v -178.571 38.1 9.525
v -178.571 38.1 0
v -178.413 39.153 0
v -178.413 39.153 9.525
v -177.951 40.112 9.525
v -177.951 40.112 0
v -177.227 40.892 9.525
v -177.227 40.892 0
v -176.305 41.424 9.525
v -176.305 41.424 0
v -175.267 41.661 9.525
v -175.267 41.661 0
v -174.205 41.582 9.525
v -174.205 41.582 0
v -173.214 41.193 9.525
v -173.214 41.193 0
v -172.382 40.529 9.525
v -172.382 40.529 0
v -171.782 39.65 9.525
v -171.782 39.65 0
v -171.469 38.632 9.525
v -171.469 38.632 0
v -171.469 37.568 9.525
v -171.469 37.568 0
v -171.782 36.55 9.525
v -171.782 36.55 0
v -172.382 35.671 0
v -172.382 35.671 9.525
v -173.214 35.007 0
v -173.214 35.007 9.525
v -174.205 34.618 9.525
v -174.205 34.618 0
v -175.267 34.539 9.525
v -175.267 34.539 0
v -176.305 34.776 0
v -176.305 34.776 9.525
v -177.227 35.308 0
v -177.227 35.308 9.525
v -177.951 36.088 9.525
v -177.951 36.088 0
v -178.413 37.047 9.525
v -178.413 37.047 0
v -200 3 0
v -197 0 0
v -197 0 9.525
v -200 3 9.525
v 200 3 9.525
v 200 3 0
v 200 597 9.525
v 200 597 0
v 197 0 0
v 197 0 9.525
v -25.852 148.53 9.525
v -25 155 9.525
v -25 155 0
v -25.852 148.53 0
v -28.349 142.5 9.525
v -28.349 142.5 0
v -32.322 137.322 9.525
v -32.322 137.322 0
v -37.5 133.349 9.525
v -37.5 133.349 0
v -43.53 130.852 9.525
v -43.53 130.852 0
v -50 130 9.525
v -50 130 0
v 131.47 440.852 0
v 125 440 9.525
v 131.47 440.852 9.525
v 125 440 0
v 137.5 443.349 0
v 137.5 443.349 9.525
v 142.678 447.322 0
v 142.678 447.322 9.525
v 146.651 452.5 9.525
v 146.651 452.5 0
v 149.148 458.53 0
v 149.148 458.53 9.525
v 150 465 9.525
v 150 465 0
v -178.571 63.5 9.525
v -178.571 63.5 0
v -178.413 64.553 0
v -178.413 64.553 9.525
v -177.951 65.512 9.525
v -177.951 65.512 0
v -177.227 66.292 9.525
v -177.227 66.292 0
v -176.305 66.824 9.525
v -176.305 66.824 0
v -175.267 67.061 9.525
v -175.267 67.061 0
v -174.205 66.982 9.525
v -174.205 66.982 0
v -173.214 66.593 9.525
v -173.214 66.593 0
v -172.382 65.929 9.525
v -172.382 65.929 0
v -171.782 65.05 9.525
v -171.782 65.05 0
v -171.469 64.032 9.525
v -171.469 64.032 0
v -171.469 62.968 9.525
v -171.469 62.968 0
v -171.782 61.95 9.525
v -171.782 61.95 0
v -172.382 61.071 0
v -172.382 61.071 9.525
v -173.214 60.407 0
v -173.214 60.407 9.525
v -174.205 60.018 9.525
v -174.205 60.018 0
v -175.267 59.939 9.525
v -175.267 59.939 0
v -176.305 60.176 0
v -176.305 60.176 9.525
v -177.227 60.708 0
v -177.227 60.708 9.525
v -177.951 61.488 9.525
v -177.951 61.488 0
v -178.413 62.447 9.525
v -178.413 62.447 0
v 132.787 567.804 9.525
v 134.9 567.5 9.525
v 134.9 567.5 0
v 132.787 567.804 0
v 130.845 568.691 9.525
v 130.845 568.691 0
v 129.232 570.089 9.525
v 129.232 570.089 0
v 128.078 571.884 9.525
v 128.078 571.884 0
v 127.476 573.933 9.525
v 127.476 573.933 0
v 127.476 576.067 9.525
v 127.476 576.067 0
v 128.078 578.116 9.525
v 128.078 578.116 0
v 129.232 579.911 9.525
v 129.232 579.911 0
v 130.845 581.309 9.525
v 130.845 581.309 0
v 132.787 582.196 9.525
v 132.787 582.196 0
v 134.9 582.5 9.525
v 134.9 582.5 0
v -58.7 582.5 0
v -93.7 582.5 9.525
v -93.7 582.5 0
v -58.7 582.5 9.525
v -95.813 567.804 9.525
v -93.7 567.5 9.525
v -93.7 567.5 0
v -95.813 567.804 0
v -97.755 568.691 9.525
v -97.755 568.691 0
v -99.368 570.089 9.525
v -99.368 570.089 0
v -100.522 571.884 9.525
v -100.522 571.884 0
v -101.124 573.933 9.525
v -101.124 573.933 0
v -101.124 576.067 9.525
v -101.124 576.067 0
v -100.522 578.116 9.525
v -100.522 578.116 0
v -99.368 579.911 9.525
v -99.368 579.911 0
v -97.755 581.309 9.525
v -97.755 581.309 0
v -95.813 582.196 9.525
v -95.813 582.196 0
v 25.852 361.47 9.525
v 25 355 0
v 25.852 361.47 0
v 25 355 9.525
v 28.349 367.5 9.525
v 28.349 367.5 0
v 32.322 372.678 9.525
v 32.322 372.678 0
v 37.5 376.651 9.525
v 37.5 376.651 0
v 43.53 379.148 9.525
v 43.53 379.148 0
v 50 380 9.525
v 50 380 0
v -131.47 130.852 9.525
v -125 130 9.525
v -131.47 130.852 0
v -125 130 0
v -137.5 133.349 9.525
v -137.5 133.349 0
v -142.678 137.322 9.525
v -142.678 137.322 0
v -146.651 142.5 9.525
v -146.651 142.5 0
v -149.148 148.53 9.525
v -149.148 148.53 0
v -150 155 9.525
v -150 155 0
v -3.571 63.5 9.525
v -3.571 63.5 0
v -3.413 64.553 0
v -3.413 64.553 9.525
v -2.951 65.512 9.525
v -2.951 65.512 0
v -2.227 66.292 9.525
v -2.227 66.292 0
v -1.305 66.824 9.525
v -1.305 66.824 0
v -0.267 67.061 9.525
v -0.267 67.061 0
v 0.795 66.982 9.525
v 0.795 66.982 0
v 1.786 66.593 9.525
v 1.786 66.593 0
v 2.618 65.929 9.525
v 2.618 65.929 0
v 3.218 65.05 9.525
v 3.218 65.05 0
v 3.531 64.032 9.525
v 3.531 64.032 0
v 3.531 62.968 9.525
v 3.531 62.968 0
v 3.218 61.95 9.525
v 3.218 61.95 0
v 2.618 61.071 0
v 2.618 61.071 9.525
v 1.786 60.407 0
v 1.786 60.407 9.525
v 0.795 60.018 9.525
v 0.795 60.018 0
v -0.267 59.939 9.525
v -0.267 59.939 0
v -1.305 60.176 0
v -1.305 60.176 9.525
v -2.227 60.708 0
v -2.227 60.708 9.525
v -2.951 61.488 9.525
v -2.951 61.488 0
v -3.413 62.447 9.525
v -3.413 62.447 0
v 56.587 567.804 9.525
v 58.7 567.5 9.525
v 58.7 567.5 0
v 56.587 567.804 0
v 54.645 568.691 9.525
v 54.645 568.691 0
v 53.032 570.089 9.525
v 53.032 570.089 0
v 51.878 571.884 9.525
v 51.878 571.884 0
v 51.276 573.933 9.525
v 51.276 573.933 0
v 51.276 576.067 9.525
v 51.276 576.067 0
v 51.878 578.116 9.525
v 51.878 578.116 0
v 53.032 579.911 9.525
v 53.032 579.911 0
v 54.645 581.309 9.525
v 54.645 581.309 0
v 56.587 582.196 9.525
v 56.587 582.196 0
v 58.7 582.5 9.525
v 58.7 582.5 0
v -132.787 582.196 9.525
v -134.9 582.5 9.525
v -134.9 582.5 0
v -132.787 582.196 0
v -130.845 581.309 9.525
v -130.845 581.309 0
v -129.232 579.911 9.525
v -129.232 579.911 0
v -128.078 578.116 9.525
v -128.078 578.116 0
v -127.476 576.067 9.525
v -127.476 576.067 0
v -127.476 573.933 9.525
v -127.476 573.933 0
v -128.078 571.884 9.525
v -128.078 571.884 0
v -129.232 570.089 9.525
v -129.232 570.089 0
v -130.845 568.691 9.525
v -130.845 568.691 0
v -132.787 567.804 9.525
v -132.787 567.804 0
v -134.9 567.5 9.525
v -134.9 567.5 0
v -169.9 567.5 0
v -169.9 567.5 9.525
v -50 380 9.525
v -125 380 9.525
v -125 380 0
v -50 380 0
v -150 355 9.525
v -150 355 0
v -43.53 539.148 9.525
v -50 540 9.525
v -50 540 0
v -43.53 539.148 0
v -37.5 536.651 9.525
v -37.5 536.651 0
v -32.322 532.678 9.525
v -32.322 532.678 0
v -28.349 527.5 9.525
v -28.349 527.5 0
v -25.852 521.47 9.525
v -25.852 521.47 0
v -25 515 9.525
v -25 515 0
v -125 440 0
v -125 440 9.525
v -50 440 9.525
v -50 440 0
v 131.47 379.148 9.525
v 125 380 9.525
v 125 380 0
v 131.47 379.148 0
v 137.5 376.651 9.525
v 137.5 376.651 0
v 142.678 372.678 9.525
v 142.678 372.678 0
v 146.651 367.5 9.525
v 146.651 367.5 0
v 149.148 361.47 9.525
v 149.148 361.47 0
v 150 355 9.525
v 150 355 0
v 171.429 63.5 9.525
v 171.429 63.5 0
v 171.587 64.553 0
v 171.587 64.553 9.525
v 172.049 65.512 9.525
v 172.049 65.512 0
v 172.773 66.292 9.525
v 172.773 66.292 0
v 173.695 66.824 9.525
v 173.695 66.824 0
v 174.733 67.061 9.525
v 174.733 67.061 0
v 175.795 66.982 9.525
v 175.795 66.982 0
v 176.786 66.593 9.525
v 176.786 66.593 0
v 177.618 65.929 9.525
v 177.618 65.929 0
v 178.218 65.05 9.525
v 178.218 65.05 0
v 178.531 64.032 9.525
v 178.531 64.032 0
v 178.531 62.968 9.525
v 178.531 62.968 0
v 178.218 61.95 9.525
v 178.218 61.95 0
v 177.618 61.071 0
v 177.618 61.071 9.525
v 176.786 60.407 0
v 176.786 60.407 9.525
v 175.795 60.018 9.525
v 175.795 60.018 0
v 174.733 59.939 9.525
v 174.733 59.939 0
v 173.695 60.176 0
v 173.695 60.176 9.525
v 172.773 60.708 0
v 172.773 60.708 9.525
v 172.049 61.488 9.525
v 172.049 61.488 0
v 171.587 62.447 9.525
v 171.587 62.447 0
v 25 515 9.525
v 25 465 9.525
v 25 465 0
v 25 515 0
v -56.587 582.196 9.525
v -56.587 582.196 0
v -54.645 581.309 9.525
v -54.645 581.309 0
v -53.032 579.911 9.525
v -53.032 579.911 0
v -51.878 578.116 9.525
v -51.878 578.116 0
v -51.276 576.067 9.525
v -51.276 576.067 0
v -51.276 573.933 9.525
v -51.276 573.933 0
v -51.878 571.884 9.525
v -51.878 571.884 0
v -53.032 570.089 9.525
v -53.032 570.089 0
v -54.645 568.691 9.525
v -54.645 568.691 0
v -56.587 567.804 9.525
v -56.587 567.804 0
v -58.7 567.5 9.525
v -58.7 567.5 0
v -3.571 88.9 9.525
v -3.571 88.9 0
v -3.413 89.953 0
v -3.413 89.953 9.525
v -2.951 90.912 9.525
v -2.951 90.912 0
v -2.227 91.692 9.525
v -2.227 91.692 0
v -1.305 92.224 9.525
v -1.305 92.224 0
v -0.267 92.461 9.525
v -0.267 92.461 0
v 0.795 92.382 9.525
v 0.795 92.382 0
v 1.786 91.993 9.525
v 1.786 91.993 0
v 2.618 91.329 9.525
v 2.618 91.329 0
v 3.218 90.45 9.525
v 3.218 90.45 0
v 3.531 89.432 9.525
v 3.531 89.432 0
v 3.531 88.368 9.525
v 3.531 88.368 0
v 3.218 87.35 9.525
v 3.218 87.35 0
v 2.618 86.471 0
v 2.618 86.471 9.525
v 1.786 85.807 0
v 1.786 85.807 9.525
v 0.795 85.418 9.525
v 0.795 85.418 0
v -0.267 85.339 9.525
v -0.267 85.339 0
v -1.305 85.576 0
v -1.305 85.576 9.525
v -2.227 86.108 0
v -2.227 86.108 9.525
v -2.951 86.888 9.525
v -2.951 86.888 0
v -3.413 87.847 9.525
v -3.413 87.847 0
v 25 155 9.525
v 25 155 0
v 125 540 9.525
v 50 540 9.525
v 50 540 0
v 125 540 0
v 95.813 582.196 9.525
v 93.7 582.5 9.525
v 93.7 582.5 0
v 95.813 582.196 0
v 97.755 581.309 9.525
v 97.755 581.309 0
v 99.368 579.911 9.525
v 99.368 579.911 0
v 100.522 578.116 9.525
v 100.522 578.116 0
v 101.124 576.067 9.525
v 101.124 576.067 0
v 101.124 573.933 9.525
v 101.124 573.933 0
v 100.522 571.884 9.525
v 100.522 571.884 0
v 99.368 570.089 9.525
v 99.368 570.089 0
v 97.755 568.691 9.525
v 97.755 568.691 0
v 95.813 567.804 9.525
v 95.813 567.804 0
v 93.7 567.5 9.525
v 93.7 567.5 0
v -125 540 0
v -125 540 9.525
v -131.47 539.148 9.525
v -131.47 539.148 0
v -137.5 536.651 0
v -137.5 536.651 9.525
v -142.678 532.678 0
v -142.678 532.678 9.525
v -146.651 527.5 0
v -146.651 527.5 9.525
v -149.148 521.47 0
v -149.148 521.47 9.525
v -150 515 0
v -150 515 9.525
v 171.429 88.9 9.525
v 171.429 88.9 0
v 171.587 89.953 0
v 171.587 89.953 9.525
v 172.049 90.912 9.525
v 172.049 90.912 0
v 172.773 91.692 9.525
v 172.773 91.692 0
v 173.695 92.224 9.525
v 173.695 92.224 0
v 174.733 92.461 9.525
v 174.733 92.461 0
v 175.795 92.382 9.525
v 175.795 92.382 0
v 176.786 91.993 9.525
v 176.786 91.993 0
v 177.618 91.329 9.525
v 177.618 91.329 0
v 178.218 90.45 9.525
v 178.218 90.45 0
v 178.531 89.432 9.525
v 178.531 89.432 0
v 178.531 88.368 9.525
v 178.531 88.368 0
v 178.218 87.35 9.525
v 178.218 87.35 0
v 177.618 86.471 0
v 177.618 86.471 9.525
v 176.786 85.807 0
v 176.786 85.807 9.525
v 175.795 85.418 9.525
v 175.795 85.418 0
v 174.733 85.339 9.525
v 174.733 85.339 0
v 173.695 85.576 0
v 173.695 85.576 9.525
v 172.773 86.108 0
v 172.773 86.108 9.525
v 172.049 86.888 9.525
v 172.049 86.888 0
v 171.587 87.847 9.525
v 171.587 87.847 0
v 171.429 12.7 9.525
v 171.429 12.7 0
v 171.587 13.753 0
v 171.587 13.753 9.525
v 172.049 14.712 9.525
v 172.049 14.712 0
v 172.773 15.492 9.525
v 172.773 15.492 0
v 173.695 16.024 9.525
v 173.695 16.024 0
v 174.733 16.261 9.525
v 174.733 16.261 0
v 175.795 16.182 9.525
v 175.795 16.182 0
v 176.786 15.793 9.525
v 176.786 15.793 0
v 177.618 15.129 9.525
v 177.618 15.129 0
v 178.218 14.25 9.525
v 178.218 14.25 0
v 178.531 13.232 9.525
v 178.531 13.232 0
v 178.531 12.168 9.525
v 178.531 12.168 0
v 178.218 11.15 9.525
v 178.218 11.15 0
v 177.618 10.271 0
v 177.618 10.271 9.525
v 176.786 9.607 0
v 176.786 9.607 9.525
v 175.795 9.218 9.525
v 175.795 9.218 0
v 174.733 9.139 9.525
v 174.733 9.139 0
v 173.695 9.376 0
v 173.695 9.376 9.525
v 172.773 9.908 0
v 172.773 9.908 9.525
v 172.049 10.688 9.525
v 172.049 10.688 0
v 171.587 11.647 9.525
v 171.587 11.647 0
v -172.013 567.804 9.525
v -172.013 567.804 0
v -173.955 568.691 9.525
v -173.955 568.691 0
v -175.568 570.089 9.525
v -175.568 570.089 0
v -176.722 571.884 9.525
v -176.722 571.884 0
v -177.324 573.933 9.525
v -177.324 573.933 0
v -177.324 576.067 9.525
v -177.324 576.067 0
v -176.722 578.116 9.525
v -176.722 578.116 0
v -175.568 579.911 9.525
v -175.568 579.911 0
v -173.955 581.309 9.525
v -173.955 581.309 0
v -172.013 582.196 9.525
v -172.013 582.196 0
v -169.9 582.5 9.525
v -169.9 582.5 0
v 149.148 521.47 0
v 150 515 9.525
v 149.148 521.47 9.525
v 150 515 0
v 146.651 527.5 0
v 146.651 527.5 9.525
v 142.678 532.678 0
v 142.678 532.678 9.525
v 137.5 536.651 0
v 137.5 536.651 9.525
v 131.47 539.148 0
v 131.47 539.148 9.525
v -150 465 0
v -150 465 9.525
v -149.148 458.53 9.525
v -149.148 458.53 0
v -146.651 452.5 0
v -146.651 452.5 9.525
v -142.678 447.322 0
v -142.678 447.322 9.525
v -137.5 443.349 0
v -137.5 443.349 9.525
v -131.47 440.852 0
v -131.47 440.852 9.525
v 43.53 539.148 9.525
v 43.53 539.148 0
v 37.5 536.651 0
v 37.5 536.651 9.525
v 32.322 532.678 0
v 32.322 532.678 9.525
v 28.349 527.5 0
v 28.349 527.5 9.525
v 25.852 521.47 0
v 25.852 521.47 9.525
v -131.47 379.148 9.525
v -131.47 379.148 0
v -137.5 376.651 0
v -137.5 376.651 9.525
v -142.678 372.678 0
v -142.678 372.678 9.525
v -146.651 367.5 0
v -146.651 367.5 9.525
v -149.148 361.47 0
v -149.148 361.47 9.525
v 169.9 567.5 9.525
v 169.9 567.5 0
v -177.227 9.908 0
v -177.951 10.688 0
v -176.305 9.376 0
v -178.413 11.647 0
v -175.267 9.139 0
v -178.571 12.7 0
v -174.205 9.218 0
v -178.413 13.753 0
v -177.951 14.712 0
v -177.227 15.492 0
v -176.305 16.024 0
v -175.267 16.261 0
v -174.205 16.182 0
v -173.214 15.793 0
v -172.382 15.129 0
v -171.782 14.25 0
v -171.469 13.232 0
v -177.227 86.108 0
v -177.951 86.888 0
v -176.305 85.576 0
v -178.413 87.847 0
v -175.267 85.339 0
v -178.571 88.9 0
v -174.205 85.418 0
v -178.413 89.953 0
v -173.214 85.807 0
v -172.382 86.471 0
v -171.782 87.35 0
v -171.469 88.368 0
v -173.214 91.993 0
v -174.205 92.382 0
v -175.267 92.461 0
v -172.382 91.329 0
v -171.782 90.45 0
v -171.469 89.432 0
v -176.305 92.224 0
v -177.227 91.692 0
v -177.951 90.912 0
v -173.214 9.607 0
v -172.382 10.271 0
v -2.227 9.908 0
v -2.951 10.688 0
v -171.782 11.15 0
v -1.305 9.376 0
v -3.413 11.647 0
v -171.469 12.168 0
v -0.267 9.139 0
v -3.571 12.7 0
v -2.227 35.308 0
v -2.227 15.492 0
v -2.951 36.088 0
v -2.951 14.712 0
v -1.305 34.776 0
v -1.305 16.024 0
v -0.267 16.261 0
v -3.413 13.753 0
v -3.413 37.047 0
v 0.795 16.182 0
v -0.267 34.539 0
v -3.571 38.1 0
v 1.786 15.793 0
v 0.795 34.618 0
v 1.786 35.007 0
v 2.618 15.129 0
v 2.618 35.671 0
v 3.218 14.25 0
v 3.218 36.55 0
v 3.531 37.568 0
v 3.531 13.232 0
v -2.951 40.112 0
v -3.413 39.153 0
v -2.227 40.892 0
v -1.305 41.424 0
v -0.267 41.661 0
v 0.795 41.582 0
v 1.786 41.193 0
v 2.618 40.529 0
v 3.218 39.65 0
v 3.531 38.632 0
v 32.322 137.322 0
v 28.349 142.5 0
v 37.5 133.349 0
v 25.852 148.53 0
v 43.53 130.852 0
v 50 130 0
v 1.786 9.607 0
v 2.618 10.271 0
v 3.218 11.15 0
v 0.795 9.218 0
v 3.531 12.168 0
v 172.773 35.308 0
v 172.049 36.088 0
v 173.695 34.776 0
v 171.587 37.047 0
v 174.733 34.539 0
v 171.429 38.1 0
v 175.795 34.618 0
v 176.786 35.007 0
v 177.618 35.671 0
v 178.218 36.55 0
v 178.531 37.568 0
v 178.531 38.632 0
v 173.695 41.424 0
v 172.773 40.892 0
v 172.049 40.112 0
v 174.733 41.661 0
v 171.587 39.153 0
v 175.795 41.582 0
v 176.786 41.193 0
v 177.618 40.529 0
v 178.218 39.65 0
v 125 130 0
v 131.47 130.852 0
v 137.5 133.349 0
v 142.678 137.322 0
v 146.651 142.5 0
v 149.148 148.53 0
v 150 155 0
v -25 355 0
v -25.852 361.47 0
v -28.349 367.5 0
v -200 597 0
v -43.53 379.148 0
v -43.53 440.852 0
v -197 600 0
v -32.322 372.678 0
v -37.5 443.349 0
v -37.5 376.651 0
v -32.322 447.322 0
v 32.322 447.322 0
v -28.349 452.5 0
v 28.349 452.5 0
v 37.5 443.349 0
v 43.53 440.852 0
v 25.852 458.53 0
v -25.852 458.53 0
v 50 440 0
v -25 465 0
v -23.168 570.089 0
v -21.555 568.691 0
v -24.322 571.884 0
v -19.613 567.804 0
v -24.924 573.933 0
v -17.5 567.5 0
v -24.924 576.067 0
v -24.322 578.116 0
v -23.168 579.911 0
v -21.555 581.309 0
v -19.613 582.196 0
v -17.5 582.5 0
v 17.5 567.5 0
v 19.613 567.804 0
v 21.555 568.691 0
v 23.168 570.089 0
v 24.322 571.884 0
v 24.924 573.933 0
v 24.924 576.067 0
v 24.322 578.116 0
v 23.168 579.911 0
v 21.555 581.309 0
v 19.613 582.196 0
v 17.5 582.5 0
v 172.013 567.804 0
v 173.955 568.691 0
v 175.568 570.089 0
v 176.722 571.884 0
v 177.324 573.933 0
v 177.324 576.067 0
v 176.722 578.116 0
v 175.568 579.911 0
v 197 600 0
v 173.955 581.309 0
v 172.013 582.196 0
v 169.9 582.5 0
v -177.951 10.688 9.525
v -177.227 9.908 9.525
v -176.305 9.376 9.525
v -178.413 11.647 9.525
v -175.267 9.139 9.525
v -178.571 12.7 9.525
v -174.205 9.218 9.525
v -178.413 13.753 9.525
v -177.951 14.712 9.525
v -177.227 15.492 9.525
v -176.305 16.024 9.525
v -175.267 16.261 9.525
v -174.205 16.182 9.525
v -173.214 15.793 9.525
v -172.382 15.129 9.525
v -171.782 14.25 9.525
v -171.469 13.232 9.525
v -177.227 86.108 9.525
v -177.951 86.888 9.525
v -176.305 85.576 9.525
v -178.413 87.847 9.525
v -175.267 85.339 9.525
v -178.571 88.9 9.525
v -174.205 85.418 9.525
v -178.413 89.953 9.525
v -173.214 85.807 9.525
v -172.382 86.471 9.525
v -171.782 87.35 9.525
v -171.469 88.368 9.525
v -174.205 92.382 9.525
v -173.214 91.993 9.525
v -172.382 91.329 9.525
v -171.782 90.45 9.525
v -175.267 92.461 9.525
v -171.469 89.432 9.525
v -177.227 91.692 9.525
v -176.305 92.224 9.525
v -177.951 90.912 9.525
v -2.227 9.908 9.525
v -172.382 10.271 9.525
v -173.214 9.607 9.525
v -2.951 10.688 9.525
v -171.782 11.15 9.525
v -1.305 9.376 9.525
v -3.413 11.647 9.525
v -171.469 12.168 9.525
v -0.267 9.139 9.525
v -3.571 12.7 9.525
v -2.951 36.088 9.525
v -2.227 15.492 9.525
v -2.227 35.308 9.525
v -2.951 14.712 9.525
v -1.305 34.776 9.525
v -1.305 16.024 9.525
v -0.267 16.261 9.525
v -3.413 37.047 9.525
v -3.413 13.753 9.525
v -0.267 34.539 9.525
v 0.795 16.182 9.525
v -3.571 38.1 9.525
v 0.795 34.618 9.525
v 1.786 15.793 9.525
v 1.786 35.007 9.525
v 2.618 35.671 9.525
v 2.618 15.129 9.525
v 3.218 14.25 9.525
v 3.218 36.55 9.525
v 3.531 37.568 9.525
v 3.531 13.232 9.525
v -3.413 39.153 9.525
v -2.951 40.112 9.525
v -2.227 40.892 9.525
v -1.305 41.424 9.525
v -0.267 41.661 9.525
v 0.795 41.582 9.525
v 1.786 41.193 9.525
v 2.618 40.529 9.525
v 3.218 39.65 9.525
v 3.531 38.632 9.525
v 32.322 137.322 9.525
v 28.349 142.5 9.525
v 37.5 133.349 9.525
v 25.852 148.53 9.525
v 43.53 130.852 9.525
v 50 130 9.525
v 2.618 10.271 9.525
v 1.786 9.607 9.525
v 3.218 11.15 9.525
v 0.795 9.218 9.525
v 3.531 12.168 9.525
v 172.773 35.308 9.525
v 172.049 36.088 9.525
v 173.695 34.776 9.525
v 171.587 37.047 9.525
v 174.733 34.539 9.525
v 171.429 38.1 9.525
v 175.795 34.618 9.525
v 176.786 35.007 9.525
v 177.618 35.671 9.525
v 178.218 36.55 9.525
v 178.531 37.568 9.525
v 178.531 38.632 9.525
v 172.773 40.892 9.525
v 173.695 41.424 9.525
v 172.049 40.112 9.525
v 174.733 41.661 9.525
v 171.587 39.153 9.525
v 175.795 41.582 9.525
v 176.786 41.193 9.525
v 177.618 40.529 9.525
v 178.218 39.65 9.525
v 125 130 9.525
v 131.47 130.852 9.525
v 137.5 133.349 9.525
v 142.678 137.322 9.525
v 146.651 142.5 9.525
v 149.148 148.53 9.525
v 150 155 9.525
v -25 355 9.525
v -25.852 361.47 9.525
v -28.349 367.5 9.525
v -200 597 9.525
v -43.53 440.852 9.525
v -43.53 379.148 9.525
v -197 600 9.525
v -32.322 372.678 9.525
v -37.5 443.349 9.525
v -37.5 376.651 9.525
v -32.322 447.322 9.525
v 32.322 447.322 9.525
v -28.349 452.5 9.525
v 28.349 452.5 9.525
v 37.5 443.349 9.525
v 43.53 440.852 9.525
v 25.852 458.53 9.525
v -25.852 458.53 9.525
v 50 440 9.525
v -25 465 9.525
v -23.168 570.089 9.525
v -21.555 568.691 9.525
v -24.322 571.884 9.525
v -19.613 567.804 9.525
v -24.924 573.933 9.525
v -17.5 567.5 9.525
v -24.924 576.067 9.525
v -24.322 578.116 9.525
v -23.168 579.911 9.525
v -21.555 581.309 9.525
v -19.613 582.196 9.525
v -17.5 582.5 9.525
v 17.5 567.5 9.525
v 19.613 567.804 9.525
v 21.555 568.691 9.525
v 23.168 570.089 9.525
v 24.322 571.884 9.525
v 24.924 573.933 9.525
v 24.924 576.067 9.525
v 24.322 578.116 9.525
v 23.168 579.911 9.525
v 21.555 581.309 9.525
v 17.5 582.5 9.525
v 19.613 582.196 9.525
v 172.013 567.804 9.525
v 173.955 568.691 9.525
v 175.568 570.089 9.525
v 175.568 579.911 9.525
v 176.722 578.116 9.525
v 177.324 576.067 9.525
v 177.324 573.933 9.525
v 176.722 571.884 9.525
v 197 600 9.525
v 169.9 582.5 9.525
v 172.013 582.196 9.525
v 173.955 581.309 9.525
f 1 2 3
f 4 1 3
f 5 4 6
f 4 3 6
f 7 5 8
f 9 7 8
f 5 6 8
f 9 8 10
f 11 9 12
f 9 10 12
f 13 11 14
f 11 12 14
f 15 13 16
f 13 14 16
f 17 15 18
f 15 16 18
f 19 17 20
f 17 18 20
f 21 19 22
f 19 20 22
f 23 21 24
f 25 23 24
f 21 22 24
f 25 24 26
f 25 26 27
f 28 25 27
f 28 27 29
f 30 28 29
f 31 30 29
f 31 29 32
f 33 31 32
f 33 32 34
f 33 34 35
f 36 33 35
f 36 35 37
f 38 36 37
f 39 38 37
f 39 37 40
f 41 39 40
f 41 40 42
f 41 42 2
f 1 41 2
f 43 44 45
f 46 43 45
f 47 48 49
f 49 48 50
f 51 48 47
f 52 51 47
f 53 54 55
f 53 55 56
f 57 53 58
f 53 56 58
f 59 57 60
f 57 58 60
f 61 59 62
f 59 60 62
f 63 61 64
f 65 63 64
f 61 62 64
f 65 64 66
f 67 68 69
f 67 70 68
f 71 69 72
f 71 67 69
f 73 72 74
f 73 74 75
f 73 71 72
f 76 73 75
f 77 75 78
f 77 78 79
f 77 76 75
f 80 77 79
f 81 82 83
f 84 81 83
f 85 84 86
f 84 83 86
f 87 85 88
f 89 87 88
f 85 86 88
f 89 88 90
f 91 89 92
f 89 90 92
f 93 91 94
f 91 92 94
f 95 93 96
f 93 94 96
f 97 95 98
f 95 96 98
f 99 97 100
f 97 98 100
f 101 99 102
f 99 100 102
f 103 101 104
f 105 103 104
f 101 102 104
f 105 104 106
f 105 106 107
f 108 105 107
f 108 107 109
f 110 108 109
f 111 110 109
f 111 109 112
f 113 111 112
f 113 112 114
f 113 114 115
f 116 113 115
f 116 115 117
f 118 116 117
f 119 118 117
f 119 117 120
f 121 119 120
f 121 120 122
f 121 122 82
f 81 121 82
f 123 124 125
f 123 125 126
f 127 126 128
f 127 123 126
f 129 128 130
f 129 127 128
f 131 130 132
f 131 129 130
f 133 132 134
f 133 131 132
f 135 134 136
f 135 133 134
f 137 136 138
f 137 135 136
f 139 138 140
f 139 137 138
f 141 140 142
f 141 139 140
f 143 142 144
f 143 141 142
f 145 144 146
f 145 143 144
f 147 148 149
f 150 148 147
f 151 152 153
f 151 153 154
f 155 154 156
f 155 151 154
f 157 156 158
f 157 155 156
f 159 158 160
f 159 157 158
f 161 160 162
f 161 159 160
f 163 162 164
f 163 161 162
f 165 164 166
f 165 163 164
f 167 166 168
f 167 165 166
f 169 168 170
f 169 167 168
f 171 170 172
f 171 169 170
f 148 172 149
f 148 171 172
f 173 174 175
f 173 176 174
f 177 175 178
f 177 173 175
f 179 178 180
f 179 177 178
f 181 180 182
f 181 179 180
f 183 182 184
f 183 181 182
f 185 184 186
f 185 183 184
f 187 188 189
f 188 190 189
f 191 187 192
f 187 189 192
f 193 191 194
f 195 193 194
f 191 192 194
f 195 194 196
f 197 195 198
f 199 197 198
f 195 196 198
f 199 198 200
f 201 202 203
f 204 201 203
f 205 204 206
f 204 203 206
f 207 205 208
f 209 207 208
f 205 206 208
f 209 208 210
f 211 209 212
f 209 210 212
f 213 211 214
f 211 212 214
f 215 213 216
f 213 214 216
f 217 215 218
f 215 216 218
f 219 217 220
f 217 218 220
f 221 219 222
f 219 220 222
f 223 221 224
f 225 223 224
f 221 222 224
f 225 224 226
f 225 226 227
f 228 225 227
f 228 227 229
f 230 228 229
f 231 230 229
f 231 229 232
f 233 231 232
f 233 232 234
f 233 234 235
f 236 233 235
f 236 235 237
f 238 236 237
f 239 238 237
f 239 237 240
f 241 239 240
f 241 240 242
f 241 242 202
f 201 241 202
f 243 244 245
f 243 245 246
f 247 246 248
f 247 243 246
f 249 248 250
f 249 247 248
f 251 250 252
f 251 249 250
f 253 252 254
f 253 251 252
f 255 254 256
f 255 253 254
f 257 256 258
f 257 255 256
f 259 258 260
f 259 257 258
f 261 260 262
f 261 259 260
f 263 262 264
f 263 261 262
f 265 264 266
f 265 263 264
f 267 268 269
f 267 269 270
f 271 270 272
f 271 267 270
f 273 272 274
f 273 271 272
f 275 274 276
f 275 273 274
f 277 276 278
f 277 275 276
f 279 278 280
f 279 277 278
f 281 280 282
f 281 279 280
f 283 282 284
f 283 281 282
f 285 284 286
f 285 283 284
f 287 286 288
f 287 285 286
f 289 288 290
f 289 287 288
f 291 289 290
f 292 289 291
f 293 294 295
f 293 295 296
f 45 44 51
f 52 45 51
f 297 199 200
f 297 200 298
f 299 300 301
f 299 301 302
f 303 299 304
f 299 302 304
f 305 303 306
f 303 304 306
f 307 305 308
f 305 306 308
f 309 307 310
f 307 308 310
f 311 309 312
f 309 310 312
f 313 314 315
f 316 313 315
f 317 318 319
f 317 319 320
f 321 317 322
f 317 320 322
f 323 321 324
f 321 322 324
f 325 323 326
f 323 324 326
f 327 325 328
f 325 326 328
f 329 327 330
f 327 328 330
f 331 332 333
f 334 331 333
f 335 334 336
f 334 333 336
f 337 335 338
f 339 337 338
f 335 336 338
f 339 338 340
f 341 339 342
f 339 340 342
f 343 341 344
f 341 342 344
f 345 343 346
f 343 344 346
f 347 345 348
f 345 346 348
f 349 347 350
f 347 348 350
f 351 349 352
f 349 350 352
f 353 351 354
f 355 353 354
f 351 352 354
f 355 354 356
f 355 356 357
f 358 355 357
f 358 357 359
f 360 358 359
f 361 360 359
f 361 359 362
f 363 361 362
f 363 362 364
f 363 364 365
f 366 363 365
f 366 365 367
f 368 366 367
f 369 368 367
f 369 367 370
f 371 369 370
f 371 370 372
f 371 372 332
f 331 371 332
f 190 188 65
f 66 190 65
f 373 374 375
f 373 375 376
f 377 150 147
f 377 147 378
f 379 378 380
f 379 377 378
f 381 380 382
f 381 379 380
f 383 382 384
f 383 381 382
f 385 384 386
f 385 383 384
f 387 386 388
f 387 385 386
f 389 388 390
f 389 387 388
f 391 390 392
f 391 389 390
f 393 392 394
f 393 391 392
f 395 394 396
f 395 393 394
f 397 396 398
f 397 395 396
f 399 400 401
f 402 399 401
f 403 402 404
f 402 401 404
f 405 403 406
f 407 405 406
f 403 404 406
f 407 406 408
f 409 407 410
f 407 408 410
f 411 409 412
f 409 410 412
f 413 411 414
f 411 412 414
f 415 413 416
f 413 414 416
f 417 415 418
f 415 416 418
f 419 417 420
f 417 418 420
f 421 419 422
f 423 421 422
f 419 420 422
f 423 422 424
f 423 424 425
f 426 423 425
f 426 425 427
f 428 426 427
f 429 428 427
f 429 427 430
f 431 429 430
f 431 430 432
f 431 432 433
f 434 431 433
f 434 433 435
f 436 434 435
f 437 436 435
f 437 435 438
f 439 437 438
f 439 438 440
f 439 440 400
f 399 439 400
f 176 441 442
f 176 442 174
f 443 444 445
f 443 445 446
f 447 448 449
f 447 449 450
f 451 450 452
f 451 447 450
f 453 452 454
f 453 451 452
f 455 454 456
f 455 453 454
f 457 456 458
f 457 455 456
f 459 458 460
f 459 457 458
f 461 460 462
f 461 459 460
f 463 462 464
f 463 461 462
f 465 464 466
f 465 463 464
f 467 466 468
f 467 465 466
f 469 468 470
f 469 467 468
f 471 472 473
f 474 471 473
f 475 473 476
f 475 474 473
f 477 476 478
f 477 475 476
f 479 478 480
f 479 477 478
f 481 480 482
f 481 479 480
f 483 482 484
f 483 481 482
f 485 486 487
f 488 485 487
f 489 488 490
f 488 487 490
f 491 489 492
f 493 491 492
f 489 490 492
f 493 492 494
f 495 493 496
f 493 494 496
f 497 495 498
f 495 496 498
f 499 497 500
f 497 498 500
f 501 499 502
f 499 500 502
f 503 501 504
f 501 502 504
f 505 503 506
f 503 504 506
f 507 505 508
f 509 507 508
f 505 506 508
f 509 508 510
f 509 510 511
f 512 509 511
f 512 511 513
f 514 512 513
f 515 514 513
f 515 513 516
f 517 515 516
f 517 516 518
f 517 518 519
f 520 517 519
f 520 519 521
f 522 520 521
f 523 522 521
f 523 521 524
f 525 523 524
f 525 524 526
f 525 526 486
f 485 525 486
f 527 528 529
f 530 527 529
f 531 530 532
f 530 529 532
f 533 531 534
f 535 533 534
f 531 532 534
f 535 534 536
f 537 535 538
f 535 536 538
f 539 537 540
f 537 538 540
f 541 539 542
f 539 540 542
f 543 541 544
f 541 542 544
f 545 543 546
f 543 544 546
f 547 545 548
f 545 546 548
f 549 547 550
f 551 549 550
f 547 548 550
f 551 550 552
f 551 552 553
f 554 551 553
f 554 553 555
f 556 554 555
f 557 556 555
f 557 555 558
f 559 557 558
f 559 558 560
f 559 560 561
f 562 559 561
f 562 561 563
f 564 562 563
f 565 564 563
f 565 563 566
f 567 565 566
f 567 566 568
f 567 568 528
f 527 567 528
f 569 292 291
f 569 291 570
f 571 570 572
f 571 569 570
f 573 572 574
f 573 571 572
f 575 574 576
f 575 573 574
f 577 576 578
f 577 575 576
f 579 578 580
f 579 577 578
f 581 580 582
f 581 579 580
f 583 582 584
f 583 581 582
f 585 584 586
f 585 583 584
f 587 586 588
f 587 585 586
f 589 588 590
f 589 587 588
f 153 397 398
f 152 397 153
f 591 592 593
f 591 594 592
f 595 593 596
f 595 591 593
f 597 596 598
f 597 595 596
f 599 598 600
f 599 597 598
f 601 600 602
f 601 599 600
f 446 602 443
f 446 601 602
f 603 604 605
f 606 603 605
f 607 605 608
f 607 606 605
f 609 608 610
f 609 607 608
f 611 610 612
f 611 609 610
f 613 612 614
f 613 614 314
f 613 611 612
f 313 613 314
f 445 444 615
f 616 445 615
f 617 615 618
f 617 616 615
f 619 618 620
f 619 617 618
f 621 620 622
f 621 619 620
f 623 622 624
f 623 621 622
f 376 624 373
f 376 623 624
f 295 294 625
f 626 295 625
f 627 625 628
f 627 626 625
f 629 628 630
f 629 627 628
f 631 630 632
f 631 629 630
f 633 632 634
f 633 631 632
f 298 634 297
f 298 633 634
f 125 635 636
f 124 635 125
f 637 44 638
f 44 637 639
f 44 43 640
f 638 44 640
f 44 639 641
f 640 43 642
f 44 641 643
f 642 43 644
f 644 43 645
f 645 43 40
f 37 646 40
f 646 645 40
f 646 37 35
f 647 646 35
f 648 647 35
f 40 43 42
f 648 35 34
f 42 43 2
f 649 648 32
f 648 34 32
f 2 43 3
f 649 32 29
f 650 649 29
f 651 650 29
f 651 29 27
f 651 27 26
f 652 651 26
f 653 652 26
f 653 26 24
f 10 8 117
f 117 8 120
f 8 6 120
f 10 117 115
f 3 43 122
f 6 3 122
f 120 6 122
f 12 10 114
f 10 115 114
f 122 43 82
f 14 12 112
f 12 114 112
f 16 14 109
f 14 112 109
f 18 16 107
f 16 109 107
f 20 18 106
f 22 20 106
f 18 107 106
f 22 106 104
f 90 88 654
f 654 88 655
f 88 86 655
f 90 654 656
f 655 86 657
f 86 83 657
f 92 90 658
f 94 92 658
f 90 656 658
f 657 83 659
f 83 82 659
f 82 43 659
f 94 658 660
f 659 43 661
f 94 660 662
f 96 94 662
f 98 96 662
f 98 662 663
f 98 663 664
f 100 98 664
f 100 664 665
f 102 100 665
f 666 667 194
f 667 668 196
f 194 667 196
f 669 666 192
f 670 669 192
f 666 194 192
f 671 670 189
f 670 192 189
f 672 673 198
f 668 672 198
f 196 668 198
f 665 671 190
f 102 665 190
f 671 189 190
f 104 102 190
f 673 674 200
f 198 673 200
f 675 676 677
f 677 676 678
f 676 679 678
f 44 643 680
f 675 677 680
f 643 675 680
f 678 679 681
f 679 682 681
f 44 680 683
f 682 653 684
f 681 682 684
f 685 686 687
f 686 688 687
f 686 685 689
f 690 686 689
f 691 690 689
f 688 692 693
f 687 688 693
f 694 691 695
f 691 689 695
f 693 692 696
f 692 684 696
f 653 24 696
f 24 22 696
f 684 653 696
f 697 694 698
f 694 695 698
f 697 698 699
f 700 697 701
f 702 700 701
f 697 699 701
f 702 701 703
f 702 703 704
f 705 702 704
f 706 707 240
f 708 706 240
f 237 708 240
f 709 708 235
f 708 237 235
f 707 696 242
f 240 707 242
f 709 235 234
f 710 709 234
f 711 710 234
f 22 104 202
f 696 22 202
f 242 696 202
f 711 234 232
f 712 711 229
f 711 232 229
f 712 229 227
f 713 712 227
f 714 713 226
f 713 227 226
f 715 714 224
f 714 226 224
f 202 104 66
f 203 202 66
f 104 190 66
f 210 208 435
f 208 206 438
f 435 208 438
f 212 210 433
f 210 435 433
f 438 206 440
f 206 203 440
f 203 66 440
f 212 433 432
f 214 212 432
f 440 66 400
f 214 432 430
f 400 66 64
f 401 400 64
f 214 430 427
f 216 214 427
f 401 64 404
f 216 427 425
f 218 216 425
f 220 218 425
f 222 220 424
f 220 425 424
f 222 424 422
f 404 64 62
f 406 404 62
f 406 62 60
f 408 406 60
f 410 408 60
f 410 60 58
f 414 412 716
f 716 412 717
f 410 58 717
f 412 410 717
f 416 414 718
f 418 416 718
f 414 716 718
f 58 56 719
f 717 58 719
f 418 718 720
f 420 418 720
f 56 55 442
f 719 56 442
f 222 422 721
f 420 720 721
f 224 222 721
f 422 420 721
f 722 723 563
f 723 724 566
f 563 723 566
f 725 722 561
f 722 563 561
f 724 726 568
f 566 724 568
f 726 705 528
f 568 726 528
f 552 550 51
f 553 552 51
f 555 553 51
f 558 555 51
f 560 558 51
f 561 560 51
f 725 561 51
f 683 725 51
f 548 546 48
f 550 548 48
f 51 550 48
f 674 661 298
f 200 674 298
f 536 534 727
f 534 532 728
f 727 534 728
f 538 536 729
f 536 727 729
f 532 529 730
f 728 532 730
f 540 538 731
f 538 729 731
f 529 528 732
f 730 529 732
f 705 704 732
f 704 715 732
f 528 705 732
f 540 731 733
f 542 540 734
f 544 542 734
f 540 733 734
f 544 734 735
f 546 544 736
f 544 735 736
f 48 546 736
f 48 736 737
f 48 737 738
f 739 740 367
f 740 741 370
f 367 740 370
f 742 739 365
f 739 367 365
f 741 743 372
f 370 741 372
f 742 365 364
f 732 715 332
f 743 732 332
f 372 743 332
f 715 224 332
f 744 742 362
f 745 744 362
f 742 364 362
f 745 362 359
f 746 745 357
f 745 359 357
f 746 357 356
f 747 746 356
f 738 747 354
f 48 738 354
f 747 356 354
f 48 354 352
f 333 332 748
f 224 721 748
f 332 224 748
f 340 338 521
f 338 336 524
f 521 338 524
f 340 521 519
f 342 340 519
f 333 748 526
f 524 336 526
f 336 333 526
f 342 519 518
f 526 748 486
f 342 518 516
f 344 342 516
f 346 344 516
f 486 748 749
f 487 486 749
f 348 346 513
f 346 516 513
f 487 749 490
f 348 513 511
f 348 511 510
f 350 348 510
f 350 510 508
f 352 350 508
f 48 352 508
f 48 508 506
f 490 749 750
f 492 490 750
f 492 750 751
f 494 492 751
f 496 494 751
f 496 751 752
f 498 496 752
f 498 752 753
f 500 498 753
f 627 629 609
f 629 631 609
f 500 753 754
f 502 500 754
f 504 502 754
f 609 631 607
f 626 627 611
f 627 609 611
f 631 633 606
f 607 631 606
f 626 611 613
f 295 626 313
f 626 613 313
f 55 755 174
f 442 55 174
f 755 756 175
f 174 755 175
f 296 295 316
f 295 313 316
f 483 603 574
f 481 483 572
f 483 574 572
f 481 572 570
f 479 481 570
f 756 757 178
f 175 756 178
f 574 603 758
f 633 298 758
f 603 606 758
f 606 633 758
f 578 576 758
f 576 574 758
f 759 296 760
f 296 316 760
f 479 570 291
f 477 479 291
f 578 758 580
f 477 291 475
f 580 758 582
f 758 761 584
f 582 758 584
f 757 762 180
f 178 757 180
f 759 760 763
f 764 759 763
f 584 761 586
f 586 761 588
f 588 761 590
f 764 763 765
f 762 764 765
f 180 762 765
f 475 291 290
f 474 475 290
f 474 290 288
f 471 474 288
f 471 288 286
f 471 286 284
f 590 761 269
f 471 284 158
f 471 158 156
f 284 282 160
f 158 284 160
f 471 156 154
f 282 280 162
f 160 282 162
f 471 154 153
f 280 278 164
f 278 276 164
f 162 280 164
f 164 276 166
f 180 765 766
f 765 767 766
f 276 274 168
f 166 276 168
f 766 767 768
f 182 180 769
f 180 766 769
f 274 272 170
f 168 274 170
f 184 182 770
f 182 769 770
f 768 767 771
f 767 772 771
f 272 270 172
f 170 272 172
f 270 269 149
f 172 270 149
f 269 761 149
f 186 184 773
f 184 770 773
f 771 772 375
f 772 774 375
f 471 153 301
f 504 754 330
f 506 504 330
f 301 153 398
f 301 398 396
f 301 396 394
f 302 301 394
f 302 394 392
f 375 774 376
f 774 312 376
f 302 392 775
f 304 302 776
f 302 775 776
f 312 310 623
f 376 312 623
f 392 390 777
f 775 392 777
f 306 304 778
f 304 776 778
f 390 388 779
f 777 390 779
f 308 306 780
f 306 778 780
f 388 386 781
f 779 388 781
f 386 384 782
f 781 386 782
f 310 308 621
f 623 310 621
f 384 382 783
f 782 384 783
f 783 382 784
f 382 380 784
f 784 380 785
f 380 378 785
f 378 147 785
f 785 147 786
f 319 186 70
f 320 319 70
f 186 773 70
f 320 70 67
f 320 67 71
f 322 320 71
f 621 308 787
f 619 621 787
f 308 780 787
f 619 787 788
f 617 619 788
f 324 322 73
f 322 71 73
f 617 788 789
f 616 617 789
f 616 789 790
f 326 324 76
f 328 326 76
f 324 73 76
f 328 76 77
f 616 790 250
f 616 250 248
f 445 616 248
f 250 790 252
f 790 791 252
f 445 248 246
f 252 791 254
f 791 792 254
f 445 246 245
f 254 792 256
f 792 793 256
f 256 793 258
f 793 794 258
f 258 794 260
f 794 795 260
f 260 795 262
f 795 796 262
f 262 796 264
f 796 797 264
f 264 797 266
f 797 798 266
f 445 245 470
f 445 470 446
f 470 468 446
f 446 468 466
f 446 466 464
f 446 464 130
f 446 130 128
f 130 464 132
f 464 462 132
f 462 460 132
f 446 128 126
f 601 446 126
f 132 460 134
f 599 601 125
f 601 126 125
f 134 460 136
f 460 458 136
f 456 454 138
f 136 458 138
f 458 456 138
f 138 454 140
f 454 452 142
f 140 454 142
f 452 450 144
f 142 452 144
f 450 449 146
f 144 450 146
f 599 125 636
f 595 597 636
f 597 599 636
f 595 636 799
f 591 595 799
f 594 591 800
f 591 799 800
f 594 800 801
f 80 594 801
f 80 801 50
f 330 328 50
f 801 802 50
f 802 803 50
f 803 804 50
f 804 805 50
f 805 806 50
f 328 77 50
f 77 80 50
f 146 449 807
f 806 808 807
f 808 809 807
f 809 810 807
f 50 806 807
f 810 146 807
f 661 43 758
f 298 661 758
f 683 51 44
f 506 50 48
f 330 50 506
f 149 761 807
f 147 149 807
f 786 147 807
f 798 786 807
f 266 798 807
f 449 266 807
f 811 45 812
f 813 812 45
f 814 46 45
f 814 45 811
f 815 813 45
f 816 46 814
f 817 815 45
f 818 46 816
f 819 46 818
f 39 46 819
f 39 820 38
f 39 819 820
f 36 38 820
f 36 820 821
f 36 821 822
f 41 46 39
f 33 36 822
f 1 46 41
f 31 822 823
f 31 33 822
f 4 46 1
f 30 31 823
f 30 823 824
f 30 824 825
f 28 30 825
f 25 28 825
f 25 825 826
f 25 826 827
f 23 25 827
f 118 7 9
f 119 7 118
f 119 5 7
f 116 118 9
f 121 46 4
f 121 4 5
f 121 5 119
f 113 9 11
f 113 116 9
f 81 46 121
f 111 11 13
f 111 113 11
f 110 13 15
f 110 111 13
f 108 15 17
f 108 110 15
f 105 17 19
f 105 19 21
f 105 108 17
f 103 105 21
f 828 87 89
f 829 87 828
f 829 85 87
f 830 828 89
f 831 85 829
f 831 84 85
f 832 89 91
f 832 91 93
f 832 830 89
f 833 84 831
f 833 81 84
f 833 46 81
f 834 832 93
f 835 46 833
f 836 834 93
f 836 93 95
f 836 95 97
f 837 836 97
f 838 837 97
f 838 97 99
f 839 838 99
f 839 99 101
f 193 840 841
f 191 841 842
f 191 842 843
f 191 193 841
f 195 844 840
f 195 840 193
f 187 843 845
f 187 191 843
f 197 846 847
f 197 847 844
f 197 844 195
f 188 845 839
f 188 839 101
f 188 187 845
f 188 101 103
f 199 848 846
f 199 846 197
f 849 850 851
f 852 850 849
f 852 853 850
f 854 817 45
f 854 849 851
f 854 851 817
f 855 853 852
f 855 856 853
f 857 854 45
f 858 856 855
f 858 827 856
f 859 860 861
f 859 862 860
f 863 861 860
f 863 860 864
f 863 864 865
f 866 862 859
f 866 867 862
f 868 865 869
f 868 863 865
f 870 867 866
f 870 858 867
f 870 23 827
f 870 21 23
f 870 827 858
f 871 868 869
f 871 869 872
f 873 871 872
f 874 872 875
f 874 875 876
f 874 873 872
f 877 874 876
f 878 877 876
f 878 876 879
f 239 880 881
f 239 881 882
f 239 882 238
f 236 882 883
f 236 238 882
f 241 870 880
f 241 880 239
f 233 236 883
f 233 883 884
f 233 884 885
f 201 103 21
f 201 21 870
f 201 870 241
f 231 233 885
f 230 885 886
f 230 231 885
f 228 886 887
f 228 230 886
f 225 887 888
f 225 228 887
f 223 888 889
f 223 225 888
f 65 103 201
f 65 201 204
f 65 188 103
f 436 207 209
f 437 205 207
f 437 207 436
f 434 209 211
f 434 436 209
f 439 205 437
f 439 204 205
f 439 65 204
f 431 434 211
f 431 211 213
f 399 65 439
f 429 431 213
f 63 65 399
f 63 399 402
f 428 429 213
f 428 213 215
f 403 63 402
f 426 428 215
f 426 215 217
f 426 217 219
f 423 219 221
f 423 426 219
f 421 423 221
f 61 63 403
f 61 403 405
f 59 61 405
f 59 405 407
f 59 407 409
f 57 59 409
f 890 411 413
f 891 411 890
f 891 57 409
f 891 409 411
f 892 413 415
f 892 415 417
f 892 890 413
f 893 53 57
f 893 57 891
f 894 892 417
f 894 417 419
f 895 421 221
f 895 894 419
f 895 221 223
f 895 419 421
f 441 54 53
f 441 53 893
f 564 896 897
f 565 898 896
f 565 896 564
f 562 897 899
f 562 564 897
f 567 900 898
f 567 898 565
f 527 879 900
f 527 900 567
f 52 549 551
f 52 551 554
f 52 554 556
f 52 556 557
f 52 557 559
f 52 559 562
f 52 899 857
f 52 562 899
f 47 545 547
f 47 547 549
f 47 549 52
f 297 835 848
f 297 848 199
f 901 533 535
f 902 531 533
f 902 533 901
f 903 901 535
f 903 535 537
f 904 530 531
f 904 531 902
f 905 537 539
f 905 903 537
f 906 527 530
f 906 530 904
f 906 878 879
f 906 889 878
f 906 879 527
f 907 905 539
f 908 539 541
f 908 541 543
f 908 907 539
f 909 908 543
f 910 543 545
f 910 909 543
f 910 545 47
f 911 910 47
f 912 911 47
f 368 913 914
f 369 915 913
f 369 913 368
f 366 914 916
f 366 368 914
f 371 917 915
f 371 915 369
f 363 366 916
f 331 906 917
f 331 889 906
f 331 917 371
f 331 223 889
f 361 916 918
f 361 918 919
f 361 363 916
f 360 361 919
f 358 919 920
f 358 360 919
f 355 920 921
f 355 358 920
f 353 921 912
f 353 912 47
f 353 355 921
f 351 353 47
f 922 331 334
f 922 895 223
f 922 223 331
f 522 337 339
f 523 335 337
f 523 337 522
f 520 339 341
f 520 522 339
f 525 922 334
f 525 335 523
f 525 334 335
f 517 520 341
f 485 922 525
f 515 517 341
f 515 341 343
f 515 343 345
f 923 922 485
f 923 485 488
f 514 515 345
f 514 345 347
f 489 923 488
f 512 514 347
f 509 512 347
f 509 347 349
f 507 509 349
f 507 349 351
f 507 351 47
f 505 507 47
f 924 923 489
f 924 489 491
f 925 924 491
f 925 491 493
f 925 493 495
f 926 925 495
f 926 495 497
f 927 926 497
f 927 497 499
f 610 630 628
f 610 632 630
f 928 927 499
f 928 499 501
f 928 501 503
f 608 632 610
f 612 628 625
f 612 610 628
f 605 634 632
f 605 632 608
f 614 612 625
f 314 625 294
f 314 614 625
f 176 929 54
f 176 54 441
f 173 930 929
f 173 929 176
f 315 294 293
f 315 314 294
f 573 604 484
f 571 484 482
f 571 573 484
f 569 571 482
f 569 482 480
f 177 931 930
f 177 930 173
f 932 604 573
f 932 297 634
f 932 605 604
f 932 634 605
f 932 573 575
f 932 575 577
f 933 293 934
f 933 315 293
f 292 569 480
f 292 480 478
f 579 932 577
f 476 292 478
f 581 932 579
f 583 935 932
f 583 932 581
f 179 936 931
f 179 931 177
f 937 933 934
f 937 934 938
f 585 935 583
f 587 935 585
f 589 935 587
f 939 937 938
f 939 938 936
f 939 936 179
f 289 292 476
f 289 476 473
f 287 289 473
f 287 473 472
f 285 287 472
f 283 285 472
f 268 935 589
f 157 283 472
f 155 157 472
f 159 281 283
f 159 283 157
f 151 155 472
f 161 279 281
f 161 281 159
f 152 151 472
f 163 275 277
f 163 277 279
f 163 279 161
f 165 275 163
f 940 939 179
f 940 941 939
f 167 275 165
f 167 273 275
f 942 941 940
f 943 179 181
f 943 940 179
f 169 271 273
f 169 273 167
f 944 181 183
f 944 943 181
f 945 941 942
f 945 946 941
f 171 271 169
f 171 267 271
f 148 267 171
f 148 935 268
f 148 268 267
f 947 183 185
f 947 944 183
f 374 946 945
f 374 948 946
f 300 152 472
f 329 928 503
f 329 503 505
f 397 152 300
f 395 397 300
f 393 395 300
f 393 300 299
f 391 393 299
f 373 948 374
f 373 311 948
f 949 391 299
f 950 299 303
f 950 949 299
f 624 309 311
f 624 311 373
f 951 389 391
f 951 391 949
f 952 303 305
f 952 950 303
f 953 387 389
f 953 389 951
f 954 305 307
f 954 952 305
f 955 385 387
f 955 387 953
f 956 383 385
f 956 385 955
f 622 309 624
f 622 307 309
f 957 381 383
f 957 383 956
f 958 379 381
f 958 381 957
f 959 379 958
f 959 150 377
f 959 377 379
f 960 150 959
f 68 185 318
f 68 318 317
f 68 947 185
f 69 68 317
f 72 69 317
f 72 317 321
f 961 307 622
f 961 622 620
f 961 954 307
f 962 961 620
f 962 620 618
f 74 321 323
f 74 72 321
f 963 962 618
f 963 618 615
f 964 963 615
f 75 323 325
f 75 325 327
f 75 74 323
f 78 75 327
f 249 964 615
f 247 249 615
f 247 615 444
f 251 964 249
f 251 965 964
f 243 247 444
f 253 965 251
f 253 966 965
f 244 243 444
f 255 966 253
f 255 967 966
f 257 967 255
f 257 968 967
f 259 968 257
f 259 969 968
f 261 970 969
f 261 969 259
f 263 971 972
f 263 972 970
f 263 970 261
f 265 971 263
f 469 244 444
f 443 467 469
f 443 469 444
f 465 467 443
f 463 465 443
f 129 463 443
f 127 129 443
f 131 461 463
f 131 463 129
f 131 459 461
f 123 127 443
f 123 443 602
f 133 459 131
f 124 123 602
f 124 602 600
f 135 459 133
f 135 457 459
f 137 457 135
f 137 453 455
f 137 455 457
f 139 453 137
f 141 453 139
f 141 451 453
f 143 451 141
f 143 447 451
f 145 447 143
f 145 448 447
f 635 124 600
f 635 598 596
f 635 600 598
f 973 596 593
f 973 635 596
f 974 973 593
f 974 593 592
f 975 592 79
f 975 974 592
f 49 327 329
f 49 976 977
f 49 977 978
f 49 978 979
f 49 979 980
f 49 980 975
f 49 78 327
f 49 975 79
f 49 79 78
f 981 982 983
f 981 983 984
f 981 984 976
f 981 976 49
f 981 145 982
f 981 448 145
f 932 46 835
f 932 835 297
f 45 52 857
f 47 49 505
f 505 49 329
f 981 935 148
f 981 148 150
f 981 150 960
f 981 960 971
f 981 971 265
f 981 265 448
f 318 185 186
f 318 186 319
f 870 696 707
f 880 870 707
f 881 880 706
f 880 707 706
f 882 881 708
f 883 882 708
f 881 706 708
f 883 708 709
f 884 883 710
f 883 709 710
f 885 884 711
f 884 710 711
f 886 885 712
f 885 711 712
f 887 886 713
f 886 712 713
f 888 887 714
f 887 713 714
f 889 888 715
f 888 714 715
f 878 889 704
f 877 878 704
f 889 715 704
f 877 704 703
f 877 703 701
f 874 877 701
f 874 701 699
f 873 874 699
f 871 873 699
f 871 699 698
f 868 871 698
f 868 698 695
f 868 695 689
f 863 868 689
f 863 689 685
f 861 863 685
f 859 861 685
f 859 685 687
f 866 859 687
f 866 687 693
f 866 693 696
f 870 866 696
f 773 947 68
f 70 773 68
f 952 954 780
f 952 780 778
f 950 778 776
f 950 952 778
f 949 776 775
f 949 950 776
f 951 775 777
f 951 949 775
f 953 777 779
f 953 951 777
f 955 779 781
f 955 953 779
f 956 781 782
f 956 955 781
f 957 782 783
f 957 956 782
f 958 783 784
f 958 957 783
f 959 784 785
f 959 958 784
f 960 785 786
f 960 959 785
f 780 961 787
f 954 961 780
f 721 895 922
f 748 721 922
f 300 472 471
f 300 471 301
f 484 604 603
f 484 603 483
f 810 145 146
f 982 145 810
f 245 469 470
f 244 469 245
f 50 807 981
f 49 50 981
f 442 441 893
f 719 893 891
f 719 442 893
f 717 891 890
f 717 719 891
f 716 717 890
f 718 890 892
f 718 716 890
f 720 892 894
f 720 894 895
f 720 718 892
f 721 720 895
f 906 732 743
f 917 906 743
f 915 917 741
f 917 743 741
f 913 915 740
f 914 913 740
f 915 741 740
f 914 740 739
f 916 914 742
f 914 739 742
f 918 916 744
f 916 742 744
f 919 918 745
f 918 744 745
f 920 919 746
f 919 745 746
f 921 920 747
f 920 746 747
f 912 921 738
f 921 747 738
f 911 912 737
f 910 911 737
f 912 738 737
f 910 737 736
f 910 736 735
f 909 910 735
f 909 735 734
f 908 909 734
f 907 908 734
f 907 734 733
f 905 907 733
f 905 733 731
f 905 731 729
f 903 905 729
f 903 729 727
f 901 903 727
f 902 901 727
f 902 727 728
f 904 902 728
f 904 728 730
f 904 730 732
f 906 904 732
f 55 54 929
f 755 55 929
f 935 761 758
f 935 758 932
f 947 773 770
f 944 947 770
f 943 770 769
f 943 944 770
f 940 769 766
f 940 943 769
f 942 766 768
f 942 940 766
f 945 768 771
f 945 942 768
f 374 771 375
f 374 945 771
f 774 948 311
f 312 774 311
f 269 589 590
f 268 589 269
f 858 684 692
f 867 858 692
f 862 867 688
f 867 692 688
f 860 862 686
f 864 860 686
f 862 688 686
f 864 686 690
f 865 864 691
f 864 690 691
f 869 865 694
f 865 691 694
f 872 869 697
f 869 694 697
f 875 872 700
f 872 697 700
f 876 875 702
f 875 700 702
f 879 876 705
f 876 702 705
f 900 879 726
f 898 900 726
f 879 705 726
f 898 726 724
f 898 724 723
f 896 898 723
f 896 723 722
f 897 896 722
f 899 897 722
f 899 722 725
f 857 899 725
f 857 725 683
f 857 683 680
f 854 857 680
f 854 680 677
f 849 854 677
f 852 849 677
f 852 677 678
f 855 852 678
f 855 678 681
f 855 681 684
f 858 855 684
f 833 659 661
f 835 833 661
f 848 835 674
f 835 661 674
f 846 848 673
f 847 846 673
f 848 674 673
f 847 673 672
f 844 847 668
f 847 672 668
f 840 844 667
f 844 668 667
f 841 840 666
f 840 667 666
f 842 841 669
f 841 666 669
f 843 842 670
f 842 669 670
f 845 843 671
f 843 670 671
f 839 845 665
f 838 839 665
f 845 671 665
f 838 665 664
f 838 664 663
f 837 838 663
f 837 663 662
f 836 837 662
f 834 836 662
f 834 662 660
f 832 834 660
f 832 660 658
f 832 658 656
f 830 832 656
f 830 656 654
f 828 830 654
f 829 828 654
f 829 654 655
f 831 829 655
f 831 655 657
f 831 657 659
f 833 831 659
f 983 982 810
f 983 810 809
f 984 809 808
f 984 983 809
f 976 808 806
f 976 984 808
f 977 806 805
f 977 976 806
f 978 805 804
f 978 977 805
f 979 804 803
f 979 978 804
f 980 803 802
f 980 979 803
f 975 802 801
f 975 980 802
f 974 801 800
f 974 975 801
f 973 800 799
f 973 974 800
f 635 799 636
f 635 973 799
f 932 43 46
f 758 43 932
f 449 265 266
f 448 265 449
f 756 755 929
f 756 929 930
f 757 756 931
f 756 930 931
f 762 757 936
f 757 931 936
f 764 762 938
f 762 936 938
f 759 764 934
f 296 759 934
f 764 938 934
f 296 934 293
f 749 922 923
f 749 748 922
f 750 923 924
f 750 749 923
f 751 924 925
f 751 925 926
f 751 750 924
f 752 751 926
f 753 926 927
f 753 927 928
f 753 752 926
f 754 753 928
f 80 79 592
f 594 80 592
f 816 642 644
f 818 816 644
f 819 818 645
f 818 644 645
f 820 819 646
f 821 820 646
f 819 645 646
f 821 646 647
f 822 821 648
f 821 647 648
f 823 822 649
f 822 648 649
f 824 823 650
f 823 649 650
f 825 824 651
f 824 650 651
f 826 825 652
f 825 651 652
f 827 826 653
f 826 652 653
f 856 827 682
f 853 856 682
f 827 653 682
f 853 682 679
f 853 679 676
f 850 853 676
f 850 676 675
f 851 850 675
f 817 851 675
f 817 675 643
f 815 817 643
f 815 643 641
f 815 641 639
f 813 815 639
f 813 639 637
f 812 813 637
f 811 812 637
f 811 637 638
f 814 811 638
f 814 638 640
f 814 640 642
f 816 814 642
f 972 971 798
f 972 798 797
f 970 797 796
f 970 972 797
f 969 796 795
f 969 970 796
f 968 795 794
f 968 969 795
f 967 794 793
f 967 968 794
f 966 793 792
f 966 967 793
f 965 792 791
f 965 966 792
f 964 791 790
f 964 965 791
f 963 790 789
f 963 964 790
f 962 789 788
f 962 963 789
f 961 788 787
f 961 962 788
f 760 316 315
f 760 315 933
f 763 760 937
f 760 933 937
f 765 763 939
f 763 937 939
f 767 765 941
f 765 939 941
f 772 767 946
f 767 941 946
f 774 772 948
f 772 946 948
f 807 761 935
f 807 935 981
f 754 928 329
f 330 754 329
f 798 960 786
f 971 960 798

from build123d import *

# Parameters (mm, degrees)
SKETCH1_W               = 400
SKETCH1_H               = 600
BOSS_EXTRUDE1_DEPTH     = 9.525
F_1_4_CLEARANCE_HOLE1_D = 7.14248
LPATTERN1_COUNT         = 2
LPATTERN1_PITCH         = 50.8
CUT_EXTRUDE2_DEPTH      = 10.525
LPATTERN2_COUNT         = 3
LPATTERN2_PITCH         = 76.2
LPATTERN2_COL_COUNT     = 3
LPATTERN2_COL_PITCH     = 76.2
SKETCH6_W               = 300
SKETCH6_H               = 250
SKETCH6_H_2             = 100
CUT_EXTRUDE1_DEPTH      = 10.525
SKETCH7_W               = 50
SKETCH7_H               = 410
BOSS_EXTRUDE2_DEPTH     = 9.525
FILLET1_R               = 25
CHAMFER2_SIZE           = 3


with BuildPart() as part:
    # Sketch1 → Boss-Extrude1 (new body)
    with BuildSketch(Plane.XY):
        with Locations((0, 300)):
            Rectangle(SKETCH1_W, SKETCH1_H)
    extrude(amount=BOSS_EXTRUDE1_DEPTH)

    # 1/4 Clearance Hole1 (through all)
    with Locations(Plane.XY.offset(9.525)):
        with Locations((-175, 12.7), (-175, 38.1), (175, 38.1), (175, 12.7), (0, 38.1), (0, 12.7)):
            f_1_4_clearance_hole1 = Hole(F_1_4_CLEARANCE_HOLE1_D / 2)

    # LPattern1: 1/4 Clearance Hole1 ×2
    with Locations(*[(0, i * LPATTERN1_PITCH, 0) for i in range(1, LPATTERN1_COUNT)]):
        add(f_1_4_clearance_hole1, mode=Mode.SUBTRACT)

    # Sketch8 → Cut-Extrude2 (cut, through all)
    with BuildSketch(Plane.XY.offset(9.525)):
        with BuildLine():
            Line((-17.5, 582.5), (17.5, 582.5))
            ThreePointArc((17.5, 582.5), (25, 575), (17.5, 567.5))
            Line((17.5, 567.5), (-17.5, 567.5))
            ThreePointArc((-17.5, 567.5), (-25, 575), (-17.5, 582.5))
        make_face()
    cut_extrude2 = extrude(amount=-CUT_EXTRUDE2_DEPTH, mode=Mode.SUBTRACT)

    # LPattern2: Cut-Extrude2 ×3
    with Locations(*[(i * LPATTERN2_PITCH, 0, 0) for i in range(1, LPATTERN2_COUNT)]):
        add(cut_extrude2, mode=Mode.SUBTRACT)

    # LPattern2 col: Cut-Extrude2 ×3
    with Locations(*[(-i * LPATTERN2_COL_PITCH, 0, 0) for i in range(1, LPATTERN2_COL_COUNT)]):
        add(cut_extrude2, mode=Mode.SUBTRACT)

    # Sketch6 → Cut-Extrude1 (cut, through all)
    with BuildSketch(Plane.XY.offset(9.525)):
        with Locations((0, 255)):
            Rectangle(SKETCH6_W, SKETCH6_H)
        with Locations((0, 490)):
            Rectangle(SKETCH6_W, SKETCH6_H_2)
    extrude(amount=-CUT_EXTRUDE1_DEPTH, mode=Mode.SUBTRACT)

    # Sketch7 → Boss-Extrude2 (add, through all)
    with BuildSketch(Plane.XY.offset(9.525)):
        with Locations((0, 335)):
            Rectangle(SKETCH7_W, SKETCH7_H)
    extrude(amount=-BOSS_EXTRUDE2_DEPTH)

    # Fillet1
    fillet1_edges = [part.edges().sort_by_distance(p)[0] for p in [
        (-150, 130, 4.7625),
        (-150, 380, 4.7625),
        (150, 380, 4.7625),
        (150, 130, 4.7625),
        (-150, 440, 4.7625),
        (-150, 540, 4.7625),
        (150, 540, 4.7625),
        (150, 440, 4.7625),
        (-25, 440, 4.7625),
        (25, 440, 4.7625),
        (25, 540, 4.7625),
        (-25, 130, 4.7625),
        (-25, 540, 4.7625),
        (25, 380, 4.7625),
        (25, 130, 4.7625),
        (-25, 380, 4.7625),
    ]]
    fillet(fillet1_edges, radius=FILLET1_R)

    # Chamfer2
    chamfer2_edges = [part.edges().sort_by_distance(p)[0] for p in [
        (-200, 600, 4.7625),
        (200, 600, 4.7625),
        (200, 0, 4.7625),
        (-200, 0, 4.7625),
    ]]
    chamfer(chamfer2_edges, length=CHAMFER2_SIZE)


solid = part.part
